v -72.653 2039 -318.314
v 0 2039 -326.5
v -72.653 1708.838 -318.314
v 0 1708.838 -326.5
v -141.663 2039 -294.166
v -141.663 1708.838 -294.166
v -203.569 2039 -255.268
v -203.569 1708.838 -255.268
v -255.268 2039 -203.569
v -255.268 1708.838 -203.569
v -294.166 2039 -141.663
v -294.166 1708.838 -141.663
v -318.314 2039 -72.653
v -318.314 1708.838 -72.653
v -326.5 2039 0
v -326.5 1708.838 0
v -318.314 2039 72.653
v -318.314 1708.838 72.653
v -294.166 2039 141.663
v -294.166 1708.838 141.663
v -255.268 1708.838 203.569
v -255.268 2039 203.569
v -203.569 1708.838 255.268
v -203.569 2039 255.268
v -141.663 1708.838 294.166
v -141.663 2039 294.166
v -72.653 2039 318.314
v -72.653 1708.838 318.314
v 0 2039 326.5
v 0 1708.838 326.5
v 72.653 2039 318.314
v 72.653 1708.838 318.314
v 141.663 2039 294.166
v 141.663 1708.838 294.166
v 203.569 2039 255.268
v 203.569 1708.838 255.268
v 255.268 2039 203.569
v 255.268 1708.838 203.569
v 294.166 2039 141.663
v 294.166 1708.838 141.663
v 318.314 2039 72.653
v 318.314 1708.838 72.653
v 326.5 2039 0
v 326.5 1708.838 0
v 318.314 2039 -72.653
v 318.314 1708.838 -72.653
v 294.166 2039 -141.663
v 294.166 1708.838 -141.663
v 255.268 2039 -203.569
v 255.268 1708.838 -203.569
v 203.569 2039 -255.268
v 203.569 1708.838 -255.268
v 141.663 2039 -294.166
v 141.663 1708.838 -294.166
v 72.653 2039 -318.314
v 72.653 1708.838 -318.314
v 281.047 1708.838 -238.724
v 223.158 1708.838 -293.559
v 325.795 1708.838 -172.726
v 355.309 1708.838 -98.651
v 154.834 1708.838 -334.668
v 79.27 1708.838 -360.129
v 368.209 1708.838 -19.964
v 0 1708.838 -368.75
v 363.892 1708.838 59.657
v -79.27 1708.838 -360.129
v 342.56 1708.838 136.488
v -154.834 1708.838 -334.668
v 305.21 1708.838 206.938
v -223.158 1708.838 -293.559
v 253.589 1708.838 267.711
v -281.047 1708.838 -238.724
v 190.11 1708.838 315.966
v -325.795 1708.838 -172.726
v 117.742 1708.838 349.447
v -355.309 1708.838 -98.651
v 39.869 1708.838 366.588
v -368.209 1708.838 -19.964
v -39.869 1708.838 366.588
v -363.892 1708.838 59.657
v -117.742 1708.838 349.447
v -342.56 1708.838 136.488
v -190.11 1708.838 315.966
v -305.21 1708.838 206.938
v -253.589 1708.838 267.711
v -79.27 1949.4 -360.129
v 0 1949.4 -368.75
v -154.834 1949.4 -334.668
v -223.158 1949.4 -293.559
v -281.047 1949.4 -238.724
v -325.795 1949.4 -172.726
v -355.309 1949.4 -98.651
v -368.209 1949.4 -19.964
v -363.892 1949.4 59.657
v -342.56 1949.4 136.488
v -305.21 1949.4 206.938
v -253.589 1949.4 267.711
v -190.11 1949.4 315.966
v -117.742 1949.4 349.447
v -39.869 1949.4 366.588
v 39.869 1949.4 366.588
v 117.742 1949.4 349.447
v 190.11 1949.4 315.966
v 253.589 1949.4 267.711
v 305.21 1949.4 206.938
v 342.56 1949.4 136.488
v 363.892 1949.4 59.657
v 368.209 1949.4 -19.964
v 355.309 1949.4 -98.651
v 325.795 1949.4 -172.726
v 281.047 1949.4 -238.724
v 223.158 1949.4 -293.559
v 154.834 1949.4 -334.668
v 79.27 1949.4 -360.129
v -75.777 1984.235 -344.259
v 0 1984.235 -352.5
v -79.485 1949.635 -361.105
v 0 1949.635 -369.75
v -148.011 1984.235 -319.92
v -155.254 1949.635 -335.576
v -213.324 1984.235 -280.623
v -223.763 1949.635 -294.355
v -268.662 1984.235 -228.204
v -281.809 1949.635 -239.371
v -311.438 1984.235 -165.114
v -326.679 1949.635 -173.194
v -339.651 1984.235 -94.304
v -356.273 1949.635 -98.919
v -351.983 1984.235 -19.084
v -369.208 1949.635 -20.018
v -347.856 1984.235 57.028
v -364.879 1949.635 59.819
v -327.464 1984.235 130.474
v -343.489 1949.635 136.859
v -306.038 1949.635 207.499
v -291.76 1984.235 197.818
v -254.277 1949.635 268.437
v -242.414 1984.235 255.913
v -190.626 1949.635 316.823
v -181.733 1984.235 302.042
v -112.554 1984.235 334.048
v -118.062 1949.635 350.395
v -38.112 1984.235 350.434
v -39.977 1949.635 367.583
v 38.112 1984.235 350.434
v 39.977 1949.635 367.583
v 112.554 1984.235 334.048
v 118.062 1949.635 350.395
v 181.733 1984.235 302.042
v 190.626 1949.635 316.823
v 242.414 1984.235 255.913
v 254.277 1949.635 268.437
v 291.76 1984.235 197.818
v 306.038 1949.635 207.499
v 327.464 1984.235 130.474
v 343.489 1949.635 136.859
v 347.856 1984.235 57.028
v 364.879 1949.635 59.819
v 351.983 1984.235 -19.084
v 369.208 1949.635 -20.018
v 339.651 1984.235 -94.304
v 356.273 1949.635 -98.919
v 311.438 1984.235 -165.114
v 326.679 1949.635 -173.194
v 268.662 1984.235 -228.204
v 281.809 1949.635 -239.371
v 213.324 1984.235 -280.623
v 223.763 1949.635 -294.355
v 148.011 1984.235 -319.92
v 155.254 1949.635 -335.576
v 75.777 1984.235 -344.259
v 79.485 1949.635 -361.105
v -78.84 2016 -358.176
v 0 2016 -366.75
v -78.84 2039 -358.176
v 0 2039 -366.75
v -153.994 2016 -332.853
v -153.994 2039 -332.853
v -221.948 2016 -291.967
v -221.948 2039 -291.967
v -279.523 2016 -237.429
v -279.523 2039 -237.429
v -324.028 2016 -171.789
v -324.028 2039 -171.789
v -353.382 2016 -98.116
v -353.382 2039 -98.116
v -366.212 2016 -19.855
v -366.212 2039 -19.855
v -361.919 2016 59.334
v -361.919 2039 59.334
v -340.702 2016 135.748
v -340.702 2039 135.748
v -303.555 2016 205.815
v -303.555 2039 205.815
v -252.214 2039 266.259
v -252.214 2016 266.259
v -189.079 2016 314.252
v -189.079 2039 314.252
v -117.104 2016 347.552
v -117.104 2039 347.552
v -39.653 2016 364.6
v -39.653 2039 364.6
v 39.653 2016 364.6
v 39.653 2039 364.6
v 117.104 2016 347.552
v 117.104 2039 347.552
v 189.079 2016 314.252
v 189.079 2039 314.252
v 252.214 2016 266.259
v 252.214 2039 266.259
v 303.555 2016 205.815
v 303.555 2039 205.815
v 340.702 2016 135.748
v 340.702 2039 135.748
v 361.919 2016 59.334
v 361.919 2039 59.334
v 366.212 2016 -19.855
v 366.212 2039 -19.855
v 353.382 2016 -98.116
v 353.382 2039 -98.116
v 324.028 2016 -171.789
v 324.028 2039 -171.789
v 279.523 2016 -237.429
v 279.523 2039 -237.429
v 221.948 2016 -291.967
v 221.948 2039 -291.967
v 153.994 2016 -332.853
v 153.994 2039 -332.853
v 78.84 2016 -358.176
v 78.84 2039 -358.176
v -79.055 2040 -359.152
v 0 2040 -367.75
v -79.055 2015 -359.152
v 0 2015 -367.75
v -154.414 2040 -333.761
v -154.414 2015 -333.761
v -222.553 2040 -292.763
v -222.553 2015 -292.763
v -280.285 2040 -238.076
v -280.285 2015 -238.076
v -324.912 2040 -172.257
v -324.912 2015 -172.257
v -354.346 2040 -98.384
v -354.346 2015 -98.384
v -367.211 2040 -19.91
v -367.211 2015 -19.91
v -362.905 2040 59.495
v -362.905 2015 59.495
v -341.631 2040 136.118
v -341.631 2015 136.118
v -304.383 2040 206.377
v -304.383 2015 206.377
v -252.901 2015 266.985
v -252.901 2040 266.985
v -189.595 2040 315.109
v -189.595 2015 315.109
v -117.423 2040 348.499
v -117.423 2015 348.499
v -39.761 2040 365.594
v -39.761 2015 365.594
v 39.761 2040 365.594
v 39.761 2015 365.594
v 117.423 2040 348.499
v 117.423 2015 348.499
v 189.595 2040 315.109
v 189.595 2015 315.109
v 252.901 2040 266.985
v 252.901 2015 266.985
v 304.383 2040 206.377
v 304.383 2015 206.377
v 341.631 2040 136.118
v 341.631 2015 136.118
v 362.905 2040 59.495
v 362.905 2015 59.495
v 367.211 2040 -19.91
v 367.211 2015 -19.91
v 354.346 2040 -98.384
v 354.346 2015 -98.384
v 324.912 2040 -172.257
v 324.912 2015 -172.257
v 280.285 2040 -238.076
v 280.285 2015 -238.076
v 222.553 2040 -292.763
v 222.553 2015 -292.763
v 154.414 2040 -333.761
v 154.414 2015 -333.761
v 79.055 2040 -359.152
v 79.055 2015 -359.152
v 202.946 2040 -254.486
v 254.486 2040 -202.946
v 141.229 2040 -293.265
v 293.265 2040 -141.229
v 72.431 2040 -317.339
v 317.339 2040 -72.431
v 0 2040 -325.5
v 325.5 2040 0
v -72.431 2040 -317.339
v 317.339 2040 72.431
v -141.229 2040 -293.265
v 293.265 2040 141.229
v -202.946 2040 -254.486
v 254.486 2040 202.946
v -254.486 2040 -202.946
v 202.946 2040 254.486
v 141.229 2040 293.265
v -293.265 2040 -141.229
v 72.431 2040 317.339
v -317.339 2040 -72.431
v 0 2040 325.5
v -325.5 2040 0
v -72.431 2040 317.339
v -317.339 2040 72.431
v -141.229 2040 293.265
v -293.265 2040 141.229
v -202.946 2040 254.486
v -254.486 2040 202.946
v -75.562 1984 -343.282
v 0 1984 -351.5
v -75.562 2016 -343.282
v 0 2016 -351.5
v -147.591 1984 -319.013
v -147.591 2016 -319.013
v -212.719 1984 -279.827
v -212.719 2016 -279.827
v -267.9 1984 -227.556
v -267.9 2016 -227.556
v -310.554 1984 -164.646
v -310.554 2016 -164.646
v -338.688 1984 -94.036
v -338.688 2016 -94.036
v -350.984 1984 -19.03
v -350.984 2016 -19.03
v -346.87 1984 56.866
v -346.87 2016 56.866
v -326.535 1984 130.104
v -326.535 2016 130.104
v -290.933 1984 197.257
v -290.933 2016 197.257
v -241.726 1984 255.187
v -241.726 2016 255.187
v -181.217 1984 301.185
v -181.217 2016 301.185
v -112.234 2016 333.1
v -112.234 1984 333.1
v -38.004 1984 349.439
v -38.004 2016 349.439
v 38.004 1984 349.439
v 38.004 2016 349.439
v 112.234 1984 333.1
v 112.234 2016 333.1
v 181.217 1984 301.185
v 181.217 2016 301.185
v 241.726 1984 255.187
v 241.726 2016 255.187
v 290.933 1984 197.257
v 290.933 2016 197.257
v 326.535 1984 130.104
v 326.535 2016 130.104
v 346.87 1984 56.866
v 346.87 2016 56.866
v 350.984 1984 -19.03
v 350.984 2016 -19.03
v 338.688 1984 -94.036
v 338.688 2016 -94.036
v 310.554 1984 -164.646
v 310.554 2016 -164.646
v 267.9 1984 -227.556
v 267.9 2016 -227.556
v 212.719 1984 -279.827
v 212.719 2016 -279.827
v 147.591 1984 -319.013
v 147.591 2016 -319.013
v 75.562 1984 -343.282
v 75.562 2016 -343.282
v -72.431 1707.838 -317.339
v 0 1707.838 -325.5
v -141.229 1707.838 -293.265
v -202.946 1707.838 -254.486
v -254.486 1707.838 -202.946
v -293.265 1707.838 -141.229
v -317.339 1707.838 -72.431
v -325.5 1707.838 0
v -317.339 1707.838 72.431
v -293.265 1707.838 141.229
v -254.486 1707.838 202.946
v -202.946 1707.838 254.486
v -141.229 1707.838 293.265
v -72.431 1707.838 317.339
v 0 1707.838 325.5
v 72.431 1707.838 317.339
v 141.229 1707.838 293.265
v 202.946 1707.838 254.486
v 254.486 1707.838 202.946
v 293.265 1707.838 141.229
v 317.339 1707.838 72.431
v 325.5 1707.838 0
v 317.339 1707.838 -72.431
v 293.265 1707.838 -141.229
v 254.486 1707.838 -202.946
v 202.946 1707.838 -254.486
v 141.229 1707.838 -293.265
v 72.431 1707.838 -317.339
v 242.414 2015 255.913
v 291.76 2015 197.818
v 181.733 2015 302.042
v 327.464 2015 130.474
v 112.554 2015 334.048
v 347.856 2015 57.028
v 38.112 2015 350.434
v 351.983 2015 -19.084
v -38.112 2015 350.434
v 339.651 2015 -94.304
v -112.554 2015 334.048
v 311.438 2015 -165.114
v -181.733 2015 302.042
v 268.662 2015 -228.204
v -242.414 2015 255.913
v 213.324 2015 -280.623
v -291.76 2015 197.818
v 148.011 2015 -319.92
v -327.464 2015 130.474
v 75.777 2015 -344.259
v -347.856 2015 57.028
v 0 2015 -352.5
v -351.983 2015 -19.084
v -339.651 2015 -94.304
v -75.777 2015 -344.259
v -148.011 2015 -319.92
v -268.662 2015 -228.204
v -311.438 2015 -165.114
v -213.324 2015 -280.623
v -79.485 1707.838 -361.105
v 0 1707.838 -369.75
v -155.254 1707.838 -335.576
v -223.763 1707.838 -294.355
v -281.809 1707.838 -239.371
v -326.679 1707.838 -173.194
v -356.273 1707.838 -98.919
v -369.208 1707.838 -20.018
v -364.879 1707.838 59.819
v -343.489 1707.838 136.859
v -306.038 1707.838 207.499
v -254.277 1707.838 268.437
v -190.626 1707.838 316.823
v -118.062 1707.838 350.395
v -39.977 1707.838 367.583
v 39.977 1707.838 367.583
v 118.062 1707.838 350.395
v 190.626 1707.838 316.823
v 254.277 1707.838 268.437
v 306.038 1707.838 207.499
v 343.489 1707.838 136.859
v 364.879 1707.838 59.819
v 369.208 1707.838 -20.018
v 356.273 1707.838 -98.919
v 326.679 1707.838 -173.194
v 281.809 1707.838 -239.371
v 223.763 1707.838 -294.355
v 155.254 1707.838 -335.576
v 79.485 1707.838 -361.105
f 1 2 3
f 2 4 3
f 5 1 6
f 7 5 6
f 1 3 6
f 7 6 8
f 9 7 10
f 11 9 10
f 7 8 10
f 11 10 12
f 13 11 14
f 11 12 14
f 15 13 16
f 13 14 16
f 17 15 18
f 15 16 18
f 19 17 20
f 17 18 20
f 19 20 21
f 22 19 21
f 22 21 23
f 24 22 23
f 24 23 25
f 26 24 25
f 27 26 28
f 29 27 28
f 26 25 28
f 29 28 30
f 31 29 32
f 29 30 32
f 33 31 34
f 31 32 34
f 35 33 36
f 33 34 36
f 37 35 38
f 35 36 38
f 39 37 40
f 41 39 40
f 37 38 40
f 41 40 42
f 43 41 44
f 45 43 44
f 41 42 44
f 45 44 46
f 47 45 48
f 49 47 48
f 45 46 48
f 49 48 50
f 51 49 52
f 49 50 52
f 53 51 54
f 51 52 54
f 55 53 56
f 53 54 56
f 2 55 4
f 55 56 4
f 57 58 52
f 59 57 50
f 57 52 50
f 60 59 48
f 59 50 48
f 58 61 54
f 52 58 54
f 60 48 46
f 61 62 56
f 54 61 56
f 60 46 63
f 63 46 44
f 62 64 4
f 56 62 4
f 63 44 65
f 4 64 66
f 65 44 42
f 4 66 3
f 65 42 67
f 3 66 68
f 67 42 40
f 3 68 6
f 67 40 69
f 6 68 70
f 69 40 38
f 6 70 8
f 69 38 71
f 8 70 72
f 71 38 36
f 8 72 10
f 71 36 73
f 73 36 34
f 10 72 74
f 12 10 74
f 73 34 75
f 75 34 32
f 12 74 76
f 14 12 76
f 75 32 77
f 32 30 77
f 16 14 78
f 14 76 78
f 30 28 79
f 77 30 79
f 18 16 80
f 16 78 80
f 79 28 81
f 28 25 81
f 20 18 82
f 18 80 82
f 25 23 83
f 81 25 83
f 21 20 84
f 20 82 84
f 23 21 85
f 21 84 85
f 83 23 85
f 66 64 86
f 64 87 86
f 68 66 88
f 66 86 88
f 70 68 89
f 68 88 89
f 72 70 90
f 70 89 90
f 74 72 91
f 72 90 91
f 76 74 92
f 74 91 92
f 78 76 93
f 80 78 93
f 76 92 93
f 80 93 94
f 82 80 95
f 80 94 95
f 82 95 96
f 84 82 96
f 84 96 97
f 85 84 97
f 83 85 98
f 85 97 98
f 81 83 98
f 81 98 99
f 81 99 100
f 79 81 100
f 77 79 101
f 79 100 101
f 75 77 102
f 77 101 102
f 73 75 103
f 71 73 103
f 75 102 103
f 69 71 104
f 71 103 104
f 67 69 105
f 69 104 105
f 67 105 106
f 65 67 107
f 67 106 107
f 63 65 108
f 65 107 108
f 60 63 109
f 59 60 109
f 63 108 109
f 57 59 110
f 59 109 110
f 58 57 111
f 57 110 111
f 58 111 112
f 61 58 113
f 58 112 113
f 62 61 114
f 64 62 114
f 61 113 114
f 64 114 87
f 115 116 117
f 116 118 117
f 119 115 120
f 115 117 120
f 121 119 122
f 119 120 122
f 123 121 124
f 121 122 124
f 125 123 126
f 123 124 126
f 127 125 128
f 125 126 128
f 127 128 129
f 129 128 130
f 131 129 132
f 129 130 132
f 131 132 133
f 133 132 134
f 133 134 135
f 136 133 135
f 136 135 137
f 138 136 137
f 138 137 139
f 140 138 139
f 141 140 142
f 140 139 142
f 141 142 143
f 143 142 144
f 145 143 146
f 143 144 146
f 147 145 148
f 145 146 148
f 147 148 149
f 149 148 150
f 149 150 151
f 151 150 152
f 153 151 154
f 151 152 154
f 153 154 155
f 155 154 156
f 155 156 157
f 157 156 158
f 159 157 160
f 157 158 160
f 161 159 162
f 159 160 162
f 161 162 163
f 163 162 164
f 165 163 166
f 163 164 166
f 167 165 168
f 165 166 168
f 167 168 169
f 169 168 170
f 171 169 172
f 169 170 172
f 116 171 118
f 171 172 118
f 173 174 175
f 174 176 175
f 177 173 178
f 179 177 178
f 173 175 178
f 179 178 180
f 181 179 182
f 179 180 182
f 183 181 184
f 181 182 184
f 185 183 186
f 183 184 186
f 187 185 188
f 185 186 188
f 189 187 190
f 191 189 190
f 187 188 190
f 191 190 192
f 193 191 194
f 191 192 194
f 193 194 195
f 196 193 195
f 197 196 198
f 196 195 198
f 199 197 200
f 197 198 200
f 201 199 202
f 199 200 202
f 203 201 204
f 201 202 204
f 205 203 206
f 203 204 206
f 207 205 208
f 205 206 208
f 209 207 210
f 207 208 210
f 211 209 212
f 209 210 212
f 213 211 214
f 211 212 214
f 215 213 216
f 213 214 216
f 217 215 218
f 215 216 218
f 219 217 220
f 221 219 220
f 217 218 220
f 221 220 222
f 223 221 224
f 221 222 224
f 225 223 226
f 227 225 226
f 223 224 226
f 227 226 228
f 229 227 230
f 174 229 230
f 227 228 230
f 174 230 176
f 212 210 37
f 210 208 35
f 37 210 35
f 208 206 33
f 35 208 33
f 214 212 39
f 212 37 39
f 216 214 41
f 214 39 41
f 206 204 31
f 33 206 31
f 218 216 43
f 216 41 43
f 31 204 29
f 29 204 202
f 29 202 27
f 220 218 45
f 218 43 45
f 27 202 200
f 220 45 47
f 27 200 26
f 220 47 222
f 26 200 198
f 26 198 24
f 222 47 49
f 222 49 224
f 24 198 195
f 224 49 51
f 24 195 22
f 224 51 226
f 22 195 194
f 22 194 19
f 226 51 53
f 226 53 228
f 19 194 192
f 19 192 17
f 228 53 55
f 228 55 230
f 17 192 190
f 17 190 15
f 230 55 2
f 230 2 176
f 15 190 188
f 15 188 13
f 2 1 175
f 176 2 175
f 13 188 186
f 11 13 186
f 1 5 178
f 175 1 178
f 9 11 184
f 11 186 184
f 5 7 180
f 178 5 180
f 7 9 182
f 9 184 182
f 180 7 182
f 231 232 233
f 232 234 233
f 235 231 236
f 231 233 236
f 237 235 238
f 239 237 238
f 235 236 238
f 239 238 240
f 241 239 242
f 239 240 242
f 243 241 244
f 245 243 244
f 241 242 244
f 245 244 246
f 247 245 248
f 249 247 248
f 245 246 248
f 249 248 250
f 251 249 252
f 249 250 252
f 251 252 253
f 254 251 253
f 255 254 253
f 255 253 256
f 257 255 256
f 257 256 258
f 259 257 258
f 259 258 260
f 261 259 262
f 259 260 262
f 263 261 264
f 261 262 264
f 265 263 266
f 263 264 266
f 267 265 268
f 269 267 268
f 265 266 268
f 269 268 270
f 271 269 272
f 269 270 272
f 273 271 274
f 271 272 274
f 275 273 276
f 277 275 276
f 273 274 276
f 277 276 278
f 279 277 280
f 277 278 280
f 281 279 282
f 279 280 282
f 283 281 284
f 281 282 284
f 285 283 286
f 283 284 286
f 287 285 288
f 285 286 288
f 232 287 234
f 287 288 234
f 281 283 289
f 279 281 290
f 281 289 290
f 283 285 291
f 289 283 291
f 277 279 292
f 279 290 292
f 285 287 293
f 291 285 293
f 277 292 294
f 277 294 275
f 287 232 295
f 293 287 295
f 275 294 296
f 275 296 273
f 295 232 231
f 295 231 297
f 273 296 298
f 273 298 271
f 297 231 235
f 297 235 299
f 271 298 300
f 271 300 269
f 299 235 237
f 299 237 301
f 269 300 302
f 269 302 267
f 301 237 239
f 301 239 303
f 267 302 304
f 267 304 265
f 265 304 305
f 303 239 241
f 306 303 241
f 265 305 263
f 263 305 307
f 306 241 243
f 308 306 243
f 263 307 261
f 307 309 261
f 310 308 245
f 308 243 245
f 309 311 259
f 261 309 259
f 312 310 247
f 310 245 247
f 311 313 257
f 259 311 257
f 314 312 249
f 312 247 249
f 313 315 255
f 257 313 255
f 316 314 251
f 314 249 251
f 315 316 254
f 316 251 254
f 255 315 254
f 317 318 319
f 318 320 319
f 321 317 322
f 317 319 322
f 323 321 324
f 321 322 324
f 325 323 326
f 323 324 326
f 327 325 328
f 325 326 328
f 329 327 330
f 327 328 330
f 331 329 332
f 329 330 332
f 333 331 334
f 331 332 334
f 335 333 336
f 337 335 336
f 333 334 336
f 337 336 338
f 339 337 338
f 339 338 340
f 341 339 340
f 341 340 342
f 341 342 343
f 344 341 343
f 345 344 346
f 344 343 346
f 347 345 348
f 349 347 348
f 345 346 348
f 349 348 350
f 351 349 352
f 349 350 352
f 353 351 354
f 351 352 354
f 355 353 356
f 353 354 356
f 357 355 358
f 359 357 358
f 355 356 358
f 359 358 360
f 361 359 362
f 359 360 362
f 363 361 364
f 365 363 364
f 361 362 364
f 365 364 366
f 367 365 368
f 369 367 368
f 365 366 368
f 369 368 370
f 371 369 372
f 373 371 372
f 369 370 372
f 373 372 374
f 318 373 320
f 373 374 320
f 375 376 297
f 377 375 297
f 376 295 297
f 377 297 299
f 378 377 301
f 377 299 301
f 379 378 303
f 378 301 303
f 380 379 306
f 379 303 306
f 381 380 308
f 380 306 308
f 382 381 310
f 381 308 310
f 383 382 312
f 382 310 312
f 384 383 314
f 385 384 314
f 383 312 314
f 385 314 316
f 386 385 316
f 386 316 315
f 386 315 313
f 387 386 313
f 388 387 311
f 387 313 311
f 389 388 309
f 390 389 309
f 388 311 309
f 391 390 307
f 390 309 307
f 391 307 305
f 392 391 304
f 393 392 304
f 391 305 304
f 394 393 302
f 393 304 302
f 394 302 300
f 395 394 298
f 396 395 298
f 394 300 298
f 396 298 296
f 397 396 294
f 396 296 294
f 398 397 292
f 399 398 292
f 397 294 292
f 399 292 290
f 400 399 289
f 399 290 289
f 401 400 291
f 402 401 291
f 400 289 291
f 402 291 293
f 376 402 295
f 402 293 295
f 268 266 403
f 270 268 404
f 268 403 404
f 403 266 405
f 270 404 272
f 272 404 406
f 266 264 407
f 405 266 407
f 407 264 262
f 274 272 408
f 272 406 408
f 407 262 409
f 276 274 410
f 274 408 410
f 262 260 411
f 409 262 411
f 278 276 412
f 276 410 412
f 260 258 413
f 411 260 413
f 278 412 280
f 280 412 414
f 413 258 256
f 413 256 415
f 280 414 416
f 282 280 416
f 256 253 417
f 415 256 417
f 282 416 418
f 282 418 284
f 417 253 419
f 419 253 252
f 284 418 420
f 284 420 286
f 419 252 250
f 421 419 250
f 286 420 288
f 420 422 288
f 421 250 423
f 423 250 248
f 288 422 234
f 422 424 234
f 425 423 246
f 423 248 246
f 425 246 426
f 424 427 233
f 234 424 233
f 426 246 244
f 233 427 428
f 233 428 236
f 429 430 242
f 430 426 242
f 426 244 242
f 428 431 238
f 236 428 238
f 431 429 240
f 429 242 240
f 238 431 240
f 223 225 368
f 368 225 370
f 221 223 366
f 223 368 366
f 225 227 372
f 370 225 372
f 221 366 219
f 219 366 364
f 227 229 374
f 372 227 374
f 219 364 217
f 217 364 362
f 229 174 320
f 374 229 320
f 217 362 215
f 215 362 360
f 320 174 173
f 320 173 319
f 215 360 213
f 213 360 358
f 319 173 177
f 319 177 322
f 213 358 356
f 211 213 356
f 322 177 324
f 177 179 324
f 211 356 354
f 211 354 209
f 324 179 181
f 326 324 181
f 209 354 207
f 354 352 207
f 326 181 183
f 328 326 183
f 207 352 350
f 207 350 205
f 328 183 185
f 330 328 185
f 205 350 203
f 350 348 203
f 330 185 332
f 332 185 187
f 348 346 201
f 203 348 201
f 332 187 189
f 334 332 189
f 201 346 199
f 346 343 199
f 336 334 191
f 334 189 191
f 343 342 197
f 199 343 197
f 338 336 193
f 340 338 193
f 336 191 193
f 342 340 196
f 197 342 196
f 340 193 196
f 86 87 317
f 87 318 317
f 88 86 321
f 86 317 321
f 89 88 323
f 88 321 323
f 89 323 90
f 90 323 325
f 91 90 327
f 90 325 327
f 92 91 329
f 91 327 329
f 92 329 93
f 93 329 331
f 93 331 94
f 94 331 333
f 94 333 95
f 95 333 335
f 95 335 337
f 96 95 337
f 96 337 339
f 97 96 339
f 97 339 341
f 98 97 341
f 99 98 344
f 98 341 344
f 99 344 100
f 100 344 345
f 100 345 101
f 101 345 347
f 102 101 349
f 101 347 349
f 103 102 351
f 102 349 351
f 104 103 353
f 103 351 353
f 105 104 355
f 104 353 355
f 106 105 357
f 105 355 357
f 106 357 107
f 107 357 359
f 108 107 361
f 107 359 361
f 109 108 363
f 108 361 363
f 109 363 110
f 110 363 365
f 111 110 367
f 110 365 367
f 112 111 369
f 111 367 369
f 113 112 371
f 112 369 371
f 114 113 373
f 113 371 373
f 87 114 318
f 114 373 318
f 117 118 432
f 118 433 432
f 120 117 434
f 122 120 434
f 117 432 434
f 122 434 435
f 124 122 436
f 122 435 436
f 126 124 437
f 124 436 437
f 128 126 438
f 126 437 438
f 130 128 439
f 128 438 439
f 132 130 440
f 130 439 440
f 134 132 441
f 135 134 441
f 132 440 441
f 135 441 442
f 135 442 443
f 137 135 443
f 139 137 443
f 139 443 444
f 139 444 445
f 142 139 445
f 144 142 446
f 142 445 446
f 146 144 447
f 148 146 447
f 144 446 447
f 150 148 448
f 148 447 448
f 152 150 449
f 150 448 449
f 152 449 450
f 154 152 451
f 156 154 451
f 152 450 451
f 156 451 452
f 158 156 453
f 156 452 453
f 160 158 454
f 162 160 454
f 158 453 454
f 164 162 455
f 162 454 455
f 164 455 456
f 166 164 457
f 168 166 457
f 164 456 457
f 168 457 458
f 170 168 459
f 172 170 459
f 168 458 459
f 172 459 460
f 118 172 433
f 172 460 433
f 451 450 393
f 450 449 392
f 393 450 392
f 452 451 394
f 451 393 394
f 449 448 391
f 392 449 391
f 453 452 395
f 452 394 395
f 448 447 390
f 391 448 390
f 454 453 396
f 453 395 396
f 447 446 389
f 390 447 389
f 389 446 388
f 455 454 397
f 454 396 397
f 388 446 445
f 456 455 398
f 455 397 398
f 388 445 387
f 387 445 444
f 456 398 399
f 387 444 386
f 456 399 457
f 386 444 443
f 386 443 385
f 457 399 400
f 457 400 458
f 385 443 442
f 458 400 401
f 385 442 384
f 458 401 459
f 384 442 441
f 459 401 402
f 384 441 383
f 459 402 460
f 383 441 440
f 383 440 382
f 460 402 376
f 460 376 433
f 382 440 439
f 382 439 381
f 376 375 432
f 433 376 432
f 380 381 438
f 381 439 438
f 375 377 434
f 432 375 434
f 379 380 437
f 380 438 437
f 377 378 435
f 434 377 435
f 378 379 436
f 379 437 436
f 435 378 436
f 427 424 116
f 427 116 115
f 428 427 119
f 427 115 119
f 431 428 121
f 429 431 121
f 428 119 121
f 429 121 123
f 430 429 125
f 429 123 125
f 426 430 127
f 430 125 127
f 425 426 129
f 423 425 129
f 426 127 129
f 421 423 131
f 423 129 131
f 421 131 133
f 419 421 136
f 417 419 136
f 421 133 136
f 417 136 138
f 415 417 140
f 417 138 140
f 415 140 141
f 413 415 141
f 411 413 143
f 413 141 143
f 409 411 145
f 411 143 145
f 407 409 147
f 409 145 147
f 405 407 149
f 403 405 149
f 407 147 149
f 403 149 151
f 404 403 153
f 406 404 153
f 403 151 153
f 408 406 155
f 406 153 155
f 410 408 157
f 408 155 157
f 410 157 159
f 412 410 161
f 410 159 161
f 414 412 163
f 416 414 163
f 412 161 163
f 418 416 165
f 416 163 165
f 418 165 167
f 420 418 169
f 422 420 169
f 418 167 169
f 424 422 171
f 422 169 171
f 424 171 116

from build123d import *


with BuildPart() as part:
    # Sketch2 one side → Revolve-Thin1 (revolve)
    with BuildSketch(Plane.XY, mode=Mode.PRIVATE) as revolve_thin1_sk:
        Polygon((-325.5, 1707.83763204), (-325.5, 2040), (-367.75, 2040), (-367.75, 2015), (-352.5, 2015), (-352.5, 1984.235457461), (-369.75, 1949.635457461), (-369.75, 1707.83763204), align=None)
        Polygon((-366.75, 2039), (-326.5, 2039), (-326.5, 1708.83763204), (-368.75, 1708.83763204), (-368.75, 1949.4), (-351.5, 1984), (-351.5, 2016), (-366.75, 2016), align=None, mode=Mode.SUBTRACT)
    revolve(revolve_thin1_sk.sketch.rotate(Axis((0, 1764, 0), (0, 1, 0)), 270), axis=Axis((0, 1764, 0), (0, 1, 0)))  # turned: the seam where the file's is


solid = part.part
